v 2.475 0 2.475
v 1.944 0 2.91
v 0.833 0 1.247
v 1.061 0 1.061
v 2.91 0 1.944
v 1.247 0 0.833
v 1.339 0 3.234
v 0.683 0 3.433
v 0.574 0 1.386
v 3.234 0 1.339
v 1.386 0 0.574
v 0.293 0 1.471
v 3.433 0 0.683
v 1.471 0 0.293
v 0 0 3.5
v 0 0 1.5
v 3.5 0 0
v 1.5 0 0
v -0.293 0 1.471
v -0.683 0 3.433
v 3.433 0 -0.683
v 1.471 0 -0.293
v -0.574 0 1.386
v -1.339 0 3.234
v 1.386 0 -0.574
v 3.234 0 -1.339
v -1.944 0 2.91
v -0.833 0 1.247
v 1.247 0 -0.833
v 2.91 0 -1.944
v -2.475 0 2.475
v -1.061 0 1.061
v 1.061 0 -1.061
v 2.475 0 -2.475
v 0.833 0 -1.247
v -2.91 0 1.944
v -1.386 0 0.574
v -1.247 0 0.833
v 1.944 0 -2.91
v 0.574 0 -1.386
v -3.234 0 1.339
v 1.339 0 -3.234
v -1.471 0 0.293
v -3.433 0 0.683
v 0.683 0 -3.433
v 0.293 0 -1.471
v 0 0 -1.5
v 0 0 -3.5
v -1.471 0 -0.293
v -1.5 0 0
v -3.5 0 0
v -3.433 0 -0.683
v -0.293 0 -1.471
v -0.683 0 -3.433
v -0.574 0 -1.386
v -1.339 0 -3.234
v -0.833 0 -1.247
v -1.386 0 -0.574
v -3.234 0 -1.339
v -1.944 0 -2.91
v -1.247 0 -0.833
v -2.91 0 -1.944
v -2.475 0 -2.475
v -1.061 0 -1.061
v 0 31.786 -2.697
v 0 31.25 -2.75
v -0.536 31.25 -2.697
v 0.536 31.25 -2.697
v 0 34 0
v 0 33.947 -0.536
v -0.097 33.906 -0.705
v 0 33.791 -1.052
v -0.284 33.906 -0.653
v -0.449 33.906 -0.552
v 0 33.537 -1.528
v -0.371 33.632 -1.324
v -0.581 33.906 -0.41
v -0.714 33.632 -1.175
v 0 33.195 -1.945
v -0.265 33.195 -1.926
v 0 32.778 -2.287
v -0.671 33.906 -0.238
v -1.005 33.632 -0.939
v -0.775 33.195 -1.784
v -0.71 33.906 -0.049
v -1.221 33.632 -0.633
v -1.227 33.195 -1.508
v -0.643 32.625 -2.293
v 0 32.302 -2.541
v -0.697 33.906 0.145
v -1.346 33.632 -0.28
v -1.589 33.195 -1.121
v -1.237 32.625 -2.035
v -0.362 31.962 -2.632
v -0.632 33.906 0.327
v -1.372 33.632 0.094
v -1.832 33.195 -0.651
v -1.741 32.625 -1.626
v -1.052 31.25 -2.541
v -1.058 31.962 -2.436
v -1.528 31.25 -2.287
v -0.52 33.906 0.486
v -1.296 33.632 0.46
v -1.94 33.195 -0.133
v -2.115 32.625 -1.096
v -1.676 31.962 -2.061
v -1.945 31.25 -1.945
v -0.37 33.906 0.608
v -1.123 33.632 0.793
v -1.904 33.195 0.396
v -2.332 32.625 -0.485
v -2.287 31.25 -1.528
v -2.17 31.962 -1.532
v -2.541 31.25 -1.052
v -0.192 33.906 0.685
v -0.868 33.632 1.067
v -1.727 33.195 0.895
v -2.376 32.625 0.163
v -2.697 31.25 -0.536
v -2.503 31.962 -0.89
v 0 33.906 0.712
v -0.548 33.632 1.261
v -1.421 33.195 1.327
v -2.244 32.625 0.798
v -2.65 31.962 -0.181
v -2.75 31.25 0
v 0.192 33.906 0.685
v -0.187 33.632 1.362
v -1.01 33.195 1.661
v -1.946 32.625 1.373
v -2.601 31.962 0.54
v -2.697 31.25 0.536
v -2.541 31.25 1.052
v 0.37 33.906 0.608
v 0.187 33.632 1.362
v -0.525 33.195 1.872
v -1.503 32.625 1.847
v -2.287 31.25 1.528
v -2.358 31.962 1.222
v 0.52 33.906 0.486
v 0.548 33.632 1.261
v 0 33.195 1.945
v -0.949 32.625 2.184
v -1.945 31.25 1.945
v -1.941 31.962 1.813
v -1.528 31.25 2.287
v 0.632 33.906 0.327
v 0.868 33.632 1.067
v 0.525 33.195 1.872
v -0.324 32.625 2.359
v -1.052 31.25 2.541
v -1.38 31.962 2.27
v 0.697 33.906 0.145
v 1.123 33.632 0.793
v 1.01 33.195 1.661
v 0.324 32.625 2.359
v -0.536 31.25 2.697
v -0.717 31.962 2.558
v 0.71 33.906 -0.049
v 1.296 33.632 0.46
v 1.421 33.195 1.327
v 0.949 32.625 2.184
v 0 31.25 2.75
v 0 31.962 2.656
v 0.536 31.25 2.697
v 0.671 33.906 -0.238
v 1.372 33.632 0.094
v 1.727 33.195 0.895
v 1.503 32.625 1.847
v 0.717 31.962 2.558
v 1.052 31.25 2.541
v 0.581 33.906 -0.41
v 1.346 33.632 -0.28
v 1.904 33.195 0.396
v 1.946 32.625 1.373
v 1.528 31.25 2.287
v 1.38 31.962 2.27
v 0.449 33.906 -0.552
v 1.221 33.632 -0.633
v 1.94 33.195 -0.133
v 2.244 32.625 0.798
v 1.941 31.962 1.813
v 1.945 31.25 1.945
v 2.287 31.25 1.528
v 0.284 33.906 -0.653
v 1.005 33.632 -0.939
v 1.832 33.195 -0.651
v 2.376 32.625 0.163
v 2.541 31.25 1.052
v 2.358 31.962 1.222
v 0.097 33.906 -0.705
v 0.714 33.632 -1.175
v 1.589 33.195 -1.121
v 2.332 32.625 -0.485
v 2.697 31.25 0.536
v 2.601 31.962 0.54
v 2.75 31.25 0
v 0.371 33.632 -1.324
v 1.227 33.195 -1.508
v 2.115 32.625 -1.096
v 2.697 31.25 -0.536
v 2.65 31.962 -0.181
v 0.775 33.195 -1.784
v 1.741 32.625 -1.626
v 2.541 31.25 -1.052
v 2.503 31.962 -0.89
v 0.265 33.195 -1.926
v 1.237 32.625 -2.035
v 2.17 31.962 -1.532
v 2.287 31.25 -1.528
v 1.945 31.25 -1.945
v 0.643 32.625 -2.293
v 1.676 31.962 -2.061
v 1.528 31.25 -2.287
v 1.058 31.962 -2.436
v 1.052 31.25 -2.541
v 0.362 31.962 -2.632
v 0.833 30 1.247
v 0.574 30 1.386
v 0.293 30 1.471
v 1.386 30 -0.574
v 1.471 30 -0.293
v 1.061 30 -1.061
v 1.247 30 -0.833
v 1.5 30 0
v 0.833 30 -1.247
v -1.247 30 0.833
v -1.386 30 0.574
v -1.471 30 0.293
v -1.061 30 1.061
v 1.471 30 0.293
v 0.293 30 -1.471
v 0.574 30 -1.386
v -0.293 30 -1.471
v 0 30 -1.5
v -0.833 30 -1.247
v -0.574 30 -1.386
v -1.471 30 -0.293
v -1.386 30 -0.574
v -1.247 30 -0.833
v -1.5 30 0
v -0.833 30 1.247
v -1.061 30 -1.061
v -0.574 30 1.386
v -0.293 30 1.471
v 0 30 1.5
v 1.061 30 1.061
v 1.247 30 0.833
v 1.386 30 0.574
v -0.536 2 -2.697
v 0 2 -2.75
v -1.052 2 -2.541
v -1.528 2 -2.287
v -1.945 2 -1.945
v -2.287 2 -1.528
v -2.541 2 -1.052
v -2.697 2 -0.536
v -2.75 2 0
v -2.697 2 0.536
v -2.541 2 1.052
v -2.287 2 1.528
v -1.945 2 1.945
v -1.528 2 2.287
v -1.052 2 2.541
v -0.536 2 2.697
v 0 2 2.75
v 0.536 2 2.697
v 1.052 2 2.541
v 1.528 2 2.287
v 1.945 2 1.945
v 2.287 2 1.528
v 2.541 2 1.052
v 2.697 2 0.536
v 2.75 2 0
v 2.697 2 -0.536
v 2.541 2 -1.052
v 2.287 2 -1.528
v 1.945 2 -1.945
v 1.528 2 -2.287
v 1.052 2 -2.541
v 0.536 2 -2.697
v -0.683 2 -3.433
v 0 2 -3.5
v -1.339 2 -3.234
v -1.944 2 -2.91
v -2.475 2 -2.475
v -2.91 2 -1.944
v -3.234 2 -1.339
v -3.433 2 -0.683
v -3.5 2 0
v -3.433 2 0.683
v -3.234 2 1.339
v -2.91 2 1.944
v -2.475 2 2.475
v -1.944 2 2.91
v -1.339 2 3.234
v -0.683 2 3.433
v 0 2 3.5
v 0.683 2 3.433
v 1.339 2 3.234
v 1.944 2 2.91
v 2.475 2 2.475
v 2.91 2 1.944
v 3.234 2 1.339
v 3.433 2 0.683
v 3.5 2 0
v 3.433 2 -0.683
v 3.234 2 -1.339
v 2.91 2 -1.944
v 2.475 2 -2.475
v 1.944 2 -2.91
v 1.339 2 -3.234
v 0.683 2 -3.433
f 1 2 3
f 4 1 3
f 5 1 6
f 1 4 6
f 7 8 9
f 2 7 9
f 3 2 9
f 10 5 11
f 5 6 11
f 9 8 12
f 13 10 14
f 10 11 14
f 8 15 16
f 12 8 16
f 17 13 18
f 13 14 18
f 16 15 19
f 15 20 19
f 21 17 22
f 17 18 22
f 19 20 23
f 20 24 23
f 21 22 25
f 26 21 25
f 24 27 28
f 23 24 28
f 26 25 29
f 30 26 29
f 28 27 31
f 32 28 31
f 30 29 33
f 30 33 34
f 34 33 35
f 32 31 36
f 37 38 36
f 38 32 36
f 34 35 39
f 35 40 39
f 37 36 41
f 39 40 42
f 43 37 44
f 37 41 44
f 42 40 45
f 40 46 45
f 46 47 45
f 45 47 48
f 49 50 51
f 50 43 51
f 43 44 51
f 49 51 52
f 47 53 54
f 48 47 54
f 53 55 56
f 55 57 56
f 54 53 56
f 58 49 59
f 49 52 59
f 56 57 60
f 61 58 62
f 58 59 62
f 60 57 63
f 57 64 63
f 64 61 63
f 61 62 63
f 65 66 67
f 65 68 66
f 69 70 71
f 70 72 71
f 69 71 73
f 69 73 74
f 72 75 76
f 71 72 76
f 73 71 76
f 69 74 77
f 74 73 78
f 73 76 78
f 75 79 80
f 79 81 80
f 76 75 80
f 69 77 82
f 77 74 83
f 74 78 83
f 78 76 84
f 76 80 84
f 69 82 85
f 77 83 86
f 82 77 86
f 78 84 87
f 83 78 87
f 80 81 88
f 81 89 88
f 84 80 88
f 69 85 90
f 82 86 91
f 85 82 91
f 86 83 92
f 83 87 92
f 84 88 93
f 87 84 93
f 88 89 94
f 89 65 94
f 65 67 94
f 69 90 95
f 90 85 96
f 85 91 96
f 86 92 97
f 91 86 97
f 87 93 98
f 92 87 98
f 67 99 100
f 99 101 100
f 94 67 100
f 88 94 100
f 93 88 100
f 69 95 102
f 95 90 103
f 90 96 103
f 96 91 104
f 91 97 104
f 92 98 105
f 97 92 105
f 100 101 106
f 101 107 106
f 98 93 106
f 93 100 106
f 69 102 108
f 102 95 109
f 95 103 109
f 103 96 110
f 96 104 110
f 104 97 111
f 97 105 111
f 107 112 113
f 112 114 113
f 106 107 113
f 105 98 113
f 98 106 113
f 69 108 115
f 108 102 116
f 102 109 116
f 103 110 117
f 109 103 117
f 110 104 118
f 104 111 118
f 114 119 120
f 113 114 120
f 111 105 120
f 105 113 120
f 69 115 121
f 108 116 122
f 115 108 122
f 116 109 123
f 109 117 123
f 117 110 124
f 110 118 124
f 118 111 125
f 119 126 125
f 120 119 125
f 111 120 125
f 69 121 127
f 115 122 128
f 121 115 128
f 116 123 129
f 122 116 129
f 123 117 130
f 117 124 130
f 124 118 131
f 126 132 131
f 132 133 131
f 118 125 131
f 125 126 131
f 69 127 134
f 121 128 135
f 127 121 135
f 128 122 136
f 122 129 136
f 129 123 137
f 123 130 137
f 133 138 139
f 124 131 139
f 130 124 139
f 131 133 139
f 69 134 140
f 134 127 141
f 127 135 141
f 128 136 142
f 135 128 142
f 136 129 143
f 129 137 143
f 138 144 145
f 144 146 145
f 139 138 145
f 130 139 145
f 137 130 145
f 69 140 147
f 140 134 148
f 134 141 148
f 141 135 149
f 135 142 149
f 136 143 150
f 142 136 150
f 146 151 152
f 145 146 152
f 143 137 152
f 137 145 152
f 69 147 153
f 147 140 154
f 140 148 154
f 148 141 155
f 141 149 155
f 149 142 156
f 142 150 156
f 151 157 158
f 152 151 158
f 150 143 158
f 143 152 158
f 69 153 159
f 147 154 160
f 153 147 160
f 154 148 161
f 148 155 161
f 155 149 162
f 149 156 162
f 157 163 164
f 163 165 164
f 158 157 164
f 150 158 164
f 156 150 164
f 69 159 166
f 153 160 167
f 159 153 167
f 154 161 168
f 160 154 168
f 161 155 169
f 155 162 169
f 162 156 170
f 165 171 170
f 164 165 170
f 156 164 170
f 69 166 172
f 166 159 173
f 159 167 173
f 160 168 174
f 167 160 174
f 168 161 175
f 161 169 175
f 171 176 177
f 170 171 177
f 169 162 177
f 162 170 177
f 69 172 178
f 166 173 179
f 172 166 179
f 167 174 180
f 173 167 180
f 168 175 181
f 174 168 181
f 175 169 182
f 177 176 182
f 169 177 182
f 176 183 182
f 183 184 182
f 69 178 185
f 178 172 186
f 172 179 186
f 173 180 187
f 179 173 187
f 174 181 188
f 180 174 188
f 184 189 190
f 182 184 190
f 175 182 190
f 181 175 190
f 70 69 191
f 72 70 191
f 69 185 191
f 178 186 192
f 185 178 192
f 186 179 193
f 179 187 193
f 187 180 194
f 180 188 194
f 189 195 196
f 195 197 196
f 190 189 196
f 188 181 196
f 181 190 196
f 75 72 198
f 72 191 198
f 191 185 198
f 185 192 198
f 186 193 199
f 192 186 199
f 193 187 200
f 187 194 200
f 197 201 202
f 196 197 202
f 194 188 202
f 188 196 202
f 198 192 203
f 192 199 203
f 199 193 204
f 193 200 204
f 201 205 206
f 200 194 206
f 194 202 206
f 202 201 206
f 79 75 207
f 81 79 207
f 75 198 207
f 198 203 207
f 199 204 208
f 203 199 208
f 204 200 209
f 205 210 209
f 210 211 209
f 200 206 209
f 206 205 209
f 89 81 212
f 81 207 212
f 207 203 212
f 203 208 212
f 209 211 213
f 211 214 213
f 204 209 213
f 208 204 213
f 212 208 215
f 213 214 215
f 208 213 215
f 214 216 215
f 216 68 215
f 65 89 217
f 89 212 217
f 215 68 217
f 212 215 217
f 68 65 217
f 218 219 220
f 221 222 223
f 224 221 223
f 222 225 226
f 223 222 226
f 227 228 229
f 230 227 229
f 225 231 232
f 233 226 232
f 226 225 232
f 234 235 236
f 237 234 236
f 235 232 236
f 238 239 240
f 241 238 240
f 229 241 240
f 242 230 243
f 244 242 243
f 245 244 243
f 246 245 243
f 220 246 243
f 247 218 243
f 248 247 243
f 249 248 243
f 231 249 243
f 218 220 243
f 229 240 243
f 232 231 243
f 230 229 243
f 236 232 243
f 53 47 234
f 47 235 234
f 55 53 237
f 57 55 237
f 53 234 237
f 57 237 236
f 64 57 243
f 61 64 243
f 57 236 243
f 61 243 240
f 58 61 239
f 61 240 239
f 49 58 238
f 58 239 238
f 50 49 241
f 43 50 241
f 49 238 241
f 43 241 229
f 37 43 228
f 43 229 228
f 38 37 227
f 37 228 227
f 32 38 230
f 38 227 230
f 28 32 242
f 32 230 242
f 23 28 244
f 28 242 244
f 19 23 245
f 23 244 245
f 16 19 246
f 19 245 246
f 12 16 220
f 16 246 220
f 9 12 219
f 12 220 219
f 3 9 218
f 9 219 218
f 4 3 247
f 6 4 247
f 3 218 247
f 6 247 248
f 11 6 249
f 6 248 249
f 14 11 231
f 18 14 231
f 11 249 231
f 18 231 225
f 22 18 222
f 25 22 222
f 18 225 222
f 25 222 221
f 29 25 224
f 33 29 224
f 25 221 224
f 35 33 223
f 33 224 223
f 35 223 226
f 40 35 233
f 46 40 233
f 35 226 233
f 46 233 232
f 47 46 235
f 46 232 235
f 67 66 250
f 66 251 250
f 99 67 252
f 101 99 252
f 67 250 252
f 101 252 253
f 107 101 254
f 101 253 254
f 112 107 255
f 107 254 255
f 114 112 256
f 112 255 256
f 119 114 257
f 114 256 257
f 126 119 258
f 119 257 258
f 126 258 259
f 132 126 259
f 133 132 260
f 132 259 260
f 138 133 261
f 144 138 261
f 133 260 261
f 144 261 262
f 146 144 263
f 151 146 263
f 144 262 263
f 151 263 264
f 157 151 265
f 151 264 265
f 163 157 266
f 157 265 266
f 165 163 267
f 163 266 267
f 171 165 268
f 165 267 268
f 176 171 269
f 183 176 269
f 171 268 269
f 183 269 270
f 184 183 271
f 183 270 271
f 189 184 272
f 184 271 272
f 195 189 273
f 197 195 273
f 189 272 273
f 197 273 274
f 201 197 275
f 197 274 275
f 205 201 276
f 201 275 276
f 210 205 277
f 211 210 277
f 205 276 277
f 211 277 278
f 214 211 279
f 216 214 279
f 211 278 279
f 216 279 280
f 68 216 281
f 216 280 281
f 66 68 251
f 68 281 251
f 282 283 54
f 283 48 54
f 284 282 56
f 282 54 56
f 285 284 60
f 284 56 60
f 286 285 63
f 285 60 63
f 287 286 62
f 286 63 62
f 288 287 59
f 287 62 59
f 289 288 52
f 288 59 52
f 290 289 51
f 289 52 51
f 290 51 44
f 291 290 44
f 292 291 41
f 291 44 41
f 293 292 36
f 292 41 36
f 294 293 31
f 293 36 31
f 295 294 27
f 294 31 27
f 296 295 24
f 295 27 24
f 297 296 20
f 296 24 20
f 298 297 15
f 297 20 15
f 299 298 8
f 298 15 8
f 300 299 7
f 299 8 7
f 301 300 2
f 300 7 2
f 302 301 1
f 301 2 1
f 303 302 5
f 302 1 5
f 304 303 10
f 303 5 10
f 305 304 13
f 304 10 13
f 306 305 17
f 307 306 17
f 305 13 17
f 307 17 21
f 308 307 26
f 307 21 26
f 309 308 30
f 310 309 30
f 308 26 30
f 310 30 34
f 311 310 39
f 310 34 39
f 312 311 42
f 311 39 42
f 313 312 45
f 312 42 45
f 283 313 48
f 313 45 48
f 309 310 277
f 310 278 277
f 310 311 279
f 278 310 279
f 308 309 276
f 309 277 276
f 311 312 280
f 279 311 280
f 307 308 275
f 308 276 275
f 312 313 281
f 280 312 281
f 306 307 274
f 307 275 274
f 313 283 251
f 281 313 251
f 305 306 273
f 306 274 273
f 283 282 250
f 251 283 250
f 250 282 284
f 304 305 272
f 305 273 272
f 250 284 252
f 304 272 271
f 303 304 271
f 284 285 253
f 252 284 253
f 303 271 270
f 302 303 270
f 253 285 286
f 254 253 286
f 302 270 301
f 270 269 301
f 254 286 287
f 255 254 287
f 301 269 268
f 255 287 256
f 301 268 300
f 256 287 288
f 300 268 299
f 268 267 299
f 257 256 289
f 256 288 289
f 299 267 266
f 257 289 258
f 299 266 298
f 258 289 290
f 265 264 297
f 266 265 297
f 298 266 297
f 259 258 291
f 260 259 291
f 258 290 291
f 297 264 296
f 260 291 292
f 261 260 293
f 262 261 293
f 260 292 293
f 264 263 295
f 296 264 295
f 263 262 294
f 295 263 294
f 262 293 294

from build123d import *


with BuildPart() as part:
    # Esquisse1 → Révolution1 (revolve)
    with BuildSketch(Plane.XY, mode=Mode.PRIVATE) as r_volution1_sk:
        with BuildLine():
            Line((-1.5, 0), (-1.5, 30))
            Line((-1.5, 30), (0, 30))
            Line((0, 30), (0, 34))
            ThreePointArc((0, 34), (-1.944543648, 33.194543648), (-2.75, 31.25))
            Line((-2.75, 31.25), (-2.75, 2))
            Line((-2.75, 2), (-3.5, 2))
            Line((-3.5, 2), (-3.5, 0))
            Line((-3.5, 0), (-1.5, 0))
        make_face()
    revolve(r_volution1_sk.sketch.rotate(Axis((0, 0, 0), (0, 1, 0)), 270), axis=Axis((0, 0, 0), (0, 1, 0)))  # turned: the seam where the file's is


solid = part.part
